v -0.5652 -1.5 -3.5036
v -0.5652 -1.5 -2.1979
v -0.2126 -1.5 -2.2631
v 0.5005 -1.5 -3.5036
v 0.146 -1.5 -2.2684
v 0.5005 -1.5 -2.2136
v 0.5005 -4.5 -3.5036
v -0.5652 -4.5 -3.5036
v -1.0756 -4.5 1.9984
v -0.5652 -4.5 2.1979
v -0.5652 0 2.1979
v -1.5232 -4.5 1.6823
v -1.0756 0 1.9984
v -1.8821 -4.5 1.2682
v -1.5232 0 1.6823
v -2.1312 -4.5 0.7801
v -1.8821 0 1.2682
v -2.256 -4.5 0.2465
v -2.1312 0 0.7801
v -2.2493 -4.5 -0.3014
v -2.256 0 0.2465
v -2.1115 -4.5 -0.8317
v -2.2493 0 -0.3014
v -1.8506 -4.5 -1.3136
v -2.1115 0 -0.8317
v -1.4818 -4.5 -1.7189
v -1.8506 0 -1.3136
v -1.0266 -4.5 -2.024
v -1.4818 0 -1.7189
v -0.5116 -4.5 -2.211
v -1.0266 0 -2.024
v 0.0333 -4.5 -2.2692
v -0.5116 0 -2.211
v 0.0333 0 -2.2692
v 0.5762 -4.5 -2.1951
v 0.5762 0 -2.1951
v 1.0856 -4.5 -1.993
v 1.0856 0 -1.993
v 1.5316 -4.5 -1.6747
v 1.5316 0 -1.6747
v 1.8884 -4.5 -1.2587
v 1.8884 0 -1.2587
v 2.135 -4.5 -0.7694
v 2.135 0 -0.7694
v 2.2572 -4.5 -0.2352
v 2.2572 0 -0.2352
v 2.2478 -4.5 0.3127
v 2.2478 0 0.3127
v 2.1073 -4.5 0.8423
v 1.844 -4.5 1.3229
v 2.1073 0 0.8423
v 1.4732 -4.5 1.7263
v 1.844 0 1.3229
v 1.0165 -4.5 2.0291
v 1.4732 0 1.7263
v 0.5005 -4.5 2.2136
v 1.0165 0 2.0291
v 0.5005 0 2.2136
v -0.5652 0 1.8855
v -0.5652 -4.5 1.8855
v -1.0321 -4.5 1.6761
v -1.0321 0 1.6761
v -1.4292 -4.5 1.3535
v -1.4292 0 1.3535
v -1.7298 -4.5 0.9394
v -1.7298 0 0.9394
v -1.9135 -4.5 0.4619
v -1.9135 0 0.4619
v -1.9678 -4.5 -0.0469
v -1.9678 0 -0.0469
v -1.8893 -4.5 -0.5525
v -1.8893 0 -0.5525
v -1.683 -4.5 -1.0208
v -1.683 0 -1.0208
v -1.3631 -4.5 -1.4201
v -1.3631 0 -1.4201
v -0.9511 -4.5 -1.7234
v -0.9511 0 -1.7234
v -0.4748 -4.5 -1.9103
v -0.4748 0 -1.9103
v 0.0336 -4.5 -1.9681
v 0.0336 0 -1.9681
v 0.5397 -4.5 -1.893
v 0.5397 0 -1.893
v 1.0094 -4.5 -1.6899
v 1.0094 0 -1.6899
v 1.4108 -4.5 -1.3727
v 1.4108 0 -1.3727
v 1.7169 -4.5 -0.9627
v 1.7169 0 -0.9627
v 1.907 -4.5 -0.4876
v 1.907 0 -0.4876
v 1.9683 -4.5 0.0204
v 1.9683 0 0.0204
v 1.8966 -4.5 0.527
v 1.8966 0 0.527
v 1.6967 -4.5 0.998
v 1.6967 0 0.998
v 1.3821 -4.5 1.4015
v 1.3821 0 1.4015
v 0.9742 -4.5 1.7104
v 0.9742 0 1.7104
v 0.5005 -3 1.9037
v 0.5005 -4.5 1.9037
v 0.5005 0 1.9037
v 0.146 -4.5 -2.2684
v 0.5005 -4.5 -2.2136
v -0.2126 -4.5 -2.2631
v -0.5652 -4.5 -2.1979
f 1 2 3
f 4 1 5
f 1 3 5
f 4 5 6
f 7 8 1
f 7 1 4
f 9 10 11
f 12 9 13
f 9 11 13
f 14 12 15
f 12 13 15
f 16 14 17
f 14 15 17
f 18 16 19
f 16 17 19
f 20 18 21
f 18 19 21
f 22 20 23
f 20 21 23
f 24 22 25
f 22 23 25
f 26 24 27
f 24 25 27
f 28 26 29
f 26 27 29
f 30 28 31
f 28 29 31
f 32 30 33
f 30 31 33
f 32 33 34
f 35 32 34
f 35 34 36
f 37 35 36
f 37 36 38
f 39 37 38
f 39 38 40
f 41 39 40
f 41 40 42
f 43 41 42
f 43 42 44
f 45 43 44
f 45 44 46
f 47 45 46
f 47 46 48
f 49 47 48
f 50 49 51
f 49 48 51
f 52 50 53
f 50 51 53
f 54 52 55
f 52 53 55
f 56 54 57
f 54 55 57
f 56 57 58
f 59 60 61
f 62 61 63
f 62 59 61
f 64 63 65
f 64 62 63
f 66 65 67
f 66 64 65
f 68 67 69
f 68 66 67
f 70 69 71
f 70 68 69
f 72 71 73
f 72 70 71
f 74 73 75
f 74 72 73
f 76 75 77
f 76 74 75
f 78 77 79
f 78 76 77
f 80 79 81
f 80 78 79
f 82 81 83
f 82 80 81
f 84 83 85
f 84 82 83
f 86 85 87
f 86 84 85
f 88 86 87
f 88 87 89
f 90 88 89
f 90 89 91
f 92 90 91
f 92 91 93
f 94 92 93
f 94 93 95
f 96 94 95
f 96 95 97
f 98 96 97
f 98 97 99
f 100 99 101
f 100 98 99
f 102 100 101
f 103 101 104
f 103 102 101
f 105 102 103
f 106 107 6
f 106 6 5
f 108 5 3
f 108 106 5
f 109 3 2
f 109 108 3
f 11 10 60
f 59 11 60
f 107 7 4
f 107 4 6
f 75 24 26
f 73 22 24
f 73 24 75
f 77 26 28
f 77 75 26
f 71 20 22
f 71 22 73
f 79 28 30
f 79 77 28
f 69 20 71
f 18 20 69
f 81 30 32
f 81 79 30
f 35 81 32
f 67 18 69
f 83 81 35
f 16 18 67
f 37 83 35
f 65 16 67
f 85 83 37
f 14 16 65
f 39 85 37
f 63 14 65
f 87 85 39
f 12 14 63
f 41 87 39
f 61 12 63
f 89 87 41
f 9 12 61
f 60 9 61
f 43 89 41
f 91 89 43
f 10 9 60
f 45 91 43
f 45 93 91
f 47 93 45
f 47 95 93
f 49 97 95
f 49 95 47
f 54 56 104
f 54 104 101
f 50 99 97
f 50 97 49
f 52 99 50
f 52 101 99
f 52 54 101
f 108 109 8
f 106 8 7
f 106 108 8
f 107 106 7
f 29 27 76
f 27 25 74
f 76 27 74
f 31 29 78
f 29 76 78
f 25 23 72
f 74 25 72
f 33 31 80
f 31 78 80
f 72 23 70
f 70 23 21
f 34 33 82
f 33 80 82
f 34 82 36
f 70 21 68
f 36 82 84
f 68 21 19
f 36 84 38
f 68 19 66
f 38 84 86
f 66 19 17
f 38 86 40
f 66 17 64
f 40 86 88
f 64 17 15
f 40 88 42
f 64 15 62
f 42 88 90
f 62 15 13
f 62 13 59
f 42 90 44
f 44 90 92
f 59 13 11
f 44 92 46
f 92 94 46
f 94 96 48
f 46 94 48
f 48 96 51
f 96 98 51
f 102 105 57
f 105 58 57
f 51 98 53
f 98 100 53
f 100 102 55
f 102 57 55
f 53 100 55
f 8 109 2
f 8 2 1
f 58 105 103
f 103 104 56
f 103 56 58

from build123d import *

# Parameters (mm, degrees)
F0_R     = 2.26945
F0_R_2   = 1.968402
F1_DEPTH = 4.5
F3_DEPTH = 25
F5_DEPTH = 3


with BuildPart() as f1:
    # F0 (on Front) → F1 (new body)
    with BuildSketch(Plane.XZ):
        Circle(F0_R)
        Circle(F0_R_2, mode=Mode.SUBTRACT)
    extrude(amount=F1_DEPTH)

    # F2 (on face) → F3 (cut)
    with BuildSketch(Plane.XZ.offset(4.5)):
        with BuildLine():
            ThreePointArc((0.500488, 2.213575), (-0.040313, 2.746496), (-0.56524, 2.197932))
            Line((-0.56524, 2.197932), (-0.56524, 1.8855))
            Line((-0.56524, 1.8855), (0.500488, 1.903712))
            Line((0.500488, 1.903712), (0.500488, 2.213575))
        make_face()
    extrude(amount=-F3_DEPTH, mode=Mode.SUBTRACT)


with BuildPart() as f5:
    # F4 (on face) → F5 (new body)
    with BuildSketch(Plane.XZ.offset(4.5)):
        with BuildLine():
            ThreePointArc((0.500488, -2.213575), (-0.033367, -2.273294), (-0.56524, -2.197932))
            Line((-0.56524, -2.197932), (-0.56524, -3.503564))
            Line((-0.56524, -3.503564), (0.500488, -3.503564))
            Line((0.500488, -3.503564), (0.500488, -2.213575))
        make_face()
    extrude(amount=-F5_DEPTH)


solid = Compound([f1.part, f5.part])
